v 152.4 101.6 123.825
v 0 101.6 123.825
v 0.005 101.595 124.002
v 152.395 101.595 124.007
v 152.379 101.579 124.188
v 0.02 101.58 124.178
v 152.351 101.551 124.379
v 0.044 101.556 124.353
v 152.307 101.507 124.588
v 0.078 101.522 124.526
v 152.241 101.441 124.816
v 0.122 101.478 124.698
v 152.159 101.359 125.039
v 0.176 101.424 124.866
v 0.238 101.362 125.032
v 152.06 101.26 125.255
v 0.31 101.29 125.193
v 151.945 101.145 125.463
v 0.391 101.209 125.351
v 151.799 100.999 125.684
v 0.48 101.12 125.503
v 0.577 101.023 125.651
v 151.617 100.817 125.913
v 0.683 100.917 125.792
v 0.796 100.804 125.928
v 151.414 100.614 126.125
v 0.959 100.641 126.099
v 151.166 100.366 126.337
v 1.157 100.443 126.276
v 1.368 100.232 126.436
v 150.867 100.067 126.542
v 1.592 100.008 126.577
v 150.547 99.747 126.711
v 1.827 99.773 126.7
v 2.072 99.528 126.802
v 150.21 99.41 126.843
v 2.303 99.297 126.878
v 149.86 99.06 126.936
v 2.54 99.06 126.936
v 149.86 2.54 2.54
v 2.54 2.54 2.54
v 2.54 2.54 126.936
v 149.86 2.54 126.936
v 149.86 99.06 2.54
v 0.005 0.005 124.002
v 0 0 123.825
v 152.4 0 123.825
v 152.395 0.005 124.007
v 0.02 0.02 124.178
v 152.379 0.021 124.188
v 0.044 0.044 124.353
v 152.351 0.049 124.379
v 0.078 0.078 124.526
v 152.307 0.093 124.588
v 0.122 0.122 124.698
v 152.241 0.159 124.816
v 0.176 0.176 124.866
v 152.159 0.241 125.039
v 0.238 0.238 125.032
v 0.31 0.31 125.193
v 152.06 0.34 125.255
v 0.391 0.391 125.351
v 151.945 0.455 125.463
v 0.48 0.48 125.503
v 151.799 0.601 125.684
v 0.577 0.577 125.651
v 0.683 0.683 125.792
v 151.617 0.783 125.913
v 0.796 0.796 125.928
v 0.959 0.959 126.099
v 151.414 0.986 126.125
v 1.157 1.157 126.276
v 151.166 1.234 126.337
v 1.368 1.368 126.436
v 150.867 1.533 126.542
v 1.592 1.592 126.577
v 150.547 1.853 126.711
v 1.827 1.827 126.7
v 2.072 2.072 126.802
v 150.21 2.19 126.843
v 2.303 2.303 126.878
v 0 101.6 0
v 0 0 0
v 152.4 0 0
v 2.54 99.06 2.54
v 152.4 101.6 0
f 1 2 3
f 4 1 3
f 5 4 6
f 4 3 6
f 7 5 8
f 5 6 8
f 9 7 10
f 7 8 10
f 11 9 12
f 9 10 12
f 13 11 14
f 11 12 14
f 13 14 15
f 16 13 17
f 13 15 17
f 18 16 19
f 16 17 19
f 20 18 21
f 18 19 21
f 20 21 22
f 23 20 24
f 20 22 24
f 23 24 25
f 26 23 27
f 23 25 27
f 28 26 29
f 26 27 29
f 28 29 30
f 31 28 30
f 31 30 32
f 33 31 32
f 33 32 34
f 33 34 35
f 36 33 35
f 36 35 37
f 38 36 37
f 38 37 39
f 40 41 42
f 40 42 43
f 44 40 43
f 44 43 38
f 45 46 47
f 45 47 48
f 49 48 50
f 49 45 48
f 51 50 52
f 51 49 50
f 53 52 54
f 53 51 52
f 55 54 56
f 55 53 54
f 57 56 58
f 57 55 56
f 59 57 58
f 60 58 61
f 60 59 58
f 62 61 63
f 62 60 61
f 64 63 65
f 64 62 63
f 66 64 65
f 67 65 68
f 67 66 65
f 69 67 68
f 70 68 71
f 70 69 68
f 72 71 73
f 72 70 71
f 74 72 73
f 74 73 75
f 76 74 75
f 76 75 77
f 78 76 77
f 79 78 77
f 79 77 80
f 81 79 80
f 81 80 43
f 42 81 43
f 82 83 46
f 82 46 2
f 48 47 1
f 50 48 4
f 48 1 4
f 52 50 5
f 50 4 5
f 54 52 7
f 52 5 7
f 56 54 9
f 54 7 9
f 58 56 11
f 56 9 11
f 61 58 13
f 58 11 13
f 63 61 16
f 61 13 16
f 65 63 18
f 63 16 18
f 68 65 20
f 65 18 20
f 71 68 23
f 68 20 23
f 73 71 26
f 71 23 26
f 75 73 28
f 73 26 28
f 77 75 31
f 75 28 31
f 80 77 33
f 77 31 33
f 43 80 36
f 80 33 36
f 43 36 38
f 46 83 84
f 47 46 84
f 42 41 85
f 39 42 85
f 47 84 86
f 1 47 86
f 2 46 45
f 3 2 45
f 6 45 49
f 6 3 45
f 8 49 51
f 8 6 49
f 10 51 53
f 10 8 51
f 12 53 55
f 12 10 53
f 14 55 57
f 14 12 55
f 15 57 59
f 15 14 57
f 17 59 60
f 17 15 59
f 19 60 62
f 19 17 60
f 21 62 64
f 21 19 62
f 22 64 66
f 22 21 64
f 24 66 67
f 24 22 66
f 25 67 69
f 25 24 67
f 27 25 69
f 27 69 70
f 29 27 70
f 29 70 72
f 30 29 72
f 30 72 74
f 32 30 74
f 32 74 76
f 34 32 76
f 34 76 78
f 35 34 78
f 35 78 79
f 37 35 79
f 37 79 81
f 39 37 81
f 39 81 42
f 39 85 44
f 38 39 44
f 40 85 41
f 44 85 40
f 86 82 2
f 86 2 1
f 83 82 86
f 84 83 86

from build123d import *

# Parameters (mm, degrees)
F0_W        = 152.4
F0_H        = 101.6
F1_DEPTH    = 127
F2_T        = -2.54
F3_T1_DEPTH = 117.475
F3_T3_DEPTH = 168.275


# Not quite as in the source:
# - a fillet or chamfer that OpenCascade refuses, or shapes differently, is made with other operations: its cross-section is extruded or revolved along the edge and cut away or added


with BuildPart() as f1:
    # F0 (on Top) → F1 (new body)
    with BuildSketch(Plane.XY):
        with Locations((76.2, 50.8)):
            Rectangle(F0_W, F0_H)
    extrude(amount=F1_DEPTH)

    # F2
    f2_openings = [f1.faces().sort_by_distance(p)[0] for p in [
        (76.2, 50.8, 127),
    ]]
    offset(amount=F2_T, openings=f2_openings)

    # F3: fillet of radius 3.175 on 4 edges, made by hand

    # F3_s2 → F3_t1 (cut)
    with BuildSketch(Plane.XZ.offset(-109.5375)):
        with BuildLine():
            ThreePointArc((0, 123.825), (0.9299359697, 126.0700640303), (3.175, 127))
            Line((3.175, 127), (0, 127))
            Line((0, 127), (0, 123.825))
        make_face()
        with BuildLine():
            ThreePointArc((152.4, 123.825), (151.4700640303, 126.0700640303), (149.225, 127))
            Line((149.225, 127), (152.4, 127))
            Line((152.4, 127), (152.4, 123.825))
        make_face()
    extrude(amount=F3_T1_DEPTH, mode=Mode.SUBTRACT)

    # F3_s4 → F3_t3 (cut)
    with BuildSketch(Plane.YZ.offset(-7.9375)):
        with BuildLine():
            ThreePointArc((0, 123.825), (0.9299359697, 126.0700640303), (3.175, 127))
            Line((3.175, 127), (0, 127))
            Line((0, 127), (0, 123.825))
        make_face()
        with BuildLine():
            ThreePointArc((101.6, 123.825), (100.6700640303, 126.0700640303), (98.425, 127))
            Line((98.425, 127), (101.6, 127))
            Line((101.6, 127), (101.6, 123.825))
        make_face()
    extrude(amount=F3_T3_DEPTH, mode=Mode.SUBTRACT)


solid = f1.part
